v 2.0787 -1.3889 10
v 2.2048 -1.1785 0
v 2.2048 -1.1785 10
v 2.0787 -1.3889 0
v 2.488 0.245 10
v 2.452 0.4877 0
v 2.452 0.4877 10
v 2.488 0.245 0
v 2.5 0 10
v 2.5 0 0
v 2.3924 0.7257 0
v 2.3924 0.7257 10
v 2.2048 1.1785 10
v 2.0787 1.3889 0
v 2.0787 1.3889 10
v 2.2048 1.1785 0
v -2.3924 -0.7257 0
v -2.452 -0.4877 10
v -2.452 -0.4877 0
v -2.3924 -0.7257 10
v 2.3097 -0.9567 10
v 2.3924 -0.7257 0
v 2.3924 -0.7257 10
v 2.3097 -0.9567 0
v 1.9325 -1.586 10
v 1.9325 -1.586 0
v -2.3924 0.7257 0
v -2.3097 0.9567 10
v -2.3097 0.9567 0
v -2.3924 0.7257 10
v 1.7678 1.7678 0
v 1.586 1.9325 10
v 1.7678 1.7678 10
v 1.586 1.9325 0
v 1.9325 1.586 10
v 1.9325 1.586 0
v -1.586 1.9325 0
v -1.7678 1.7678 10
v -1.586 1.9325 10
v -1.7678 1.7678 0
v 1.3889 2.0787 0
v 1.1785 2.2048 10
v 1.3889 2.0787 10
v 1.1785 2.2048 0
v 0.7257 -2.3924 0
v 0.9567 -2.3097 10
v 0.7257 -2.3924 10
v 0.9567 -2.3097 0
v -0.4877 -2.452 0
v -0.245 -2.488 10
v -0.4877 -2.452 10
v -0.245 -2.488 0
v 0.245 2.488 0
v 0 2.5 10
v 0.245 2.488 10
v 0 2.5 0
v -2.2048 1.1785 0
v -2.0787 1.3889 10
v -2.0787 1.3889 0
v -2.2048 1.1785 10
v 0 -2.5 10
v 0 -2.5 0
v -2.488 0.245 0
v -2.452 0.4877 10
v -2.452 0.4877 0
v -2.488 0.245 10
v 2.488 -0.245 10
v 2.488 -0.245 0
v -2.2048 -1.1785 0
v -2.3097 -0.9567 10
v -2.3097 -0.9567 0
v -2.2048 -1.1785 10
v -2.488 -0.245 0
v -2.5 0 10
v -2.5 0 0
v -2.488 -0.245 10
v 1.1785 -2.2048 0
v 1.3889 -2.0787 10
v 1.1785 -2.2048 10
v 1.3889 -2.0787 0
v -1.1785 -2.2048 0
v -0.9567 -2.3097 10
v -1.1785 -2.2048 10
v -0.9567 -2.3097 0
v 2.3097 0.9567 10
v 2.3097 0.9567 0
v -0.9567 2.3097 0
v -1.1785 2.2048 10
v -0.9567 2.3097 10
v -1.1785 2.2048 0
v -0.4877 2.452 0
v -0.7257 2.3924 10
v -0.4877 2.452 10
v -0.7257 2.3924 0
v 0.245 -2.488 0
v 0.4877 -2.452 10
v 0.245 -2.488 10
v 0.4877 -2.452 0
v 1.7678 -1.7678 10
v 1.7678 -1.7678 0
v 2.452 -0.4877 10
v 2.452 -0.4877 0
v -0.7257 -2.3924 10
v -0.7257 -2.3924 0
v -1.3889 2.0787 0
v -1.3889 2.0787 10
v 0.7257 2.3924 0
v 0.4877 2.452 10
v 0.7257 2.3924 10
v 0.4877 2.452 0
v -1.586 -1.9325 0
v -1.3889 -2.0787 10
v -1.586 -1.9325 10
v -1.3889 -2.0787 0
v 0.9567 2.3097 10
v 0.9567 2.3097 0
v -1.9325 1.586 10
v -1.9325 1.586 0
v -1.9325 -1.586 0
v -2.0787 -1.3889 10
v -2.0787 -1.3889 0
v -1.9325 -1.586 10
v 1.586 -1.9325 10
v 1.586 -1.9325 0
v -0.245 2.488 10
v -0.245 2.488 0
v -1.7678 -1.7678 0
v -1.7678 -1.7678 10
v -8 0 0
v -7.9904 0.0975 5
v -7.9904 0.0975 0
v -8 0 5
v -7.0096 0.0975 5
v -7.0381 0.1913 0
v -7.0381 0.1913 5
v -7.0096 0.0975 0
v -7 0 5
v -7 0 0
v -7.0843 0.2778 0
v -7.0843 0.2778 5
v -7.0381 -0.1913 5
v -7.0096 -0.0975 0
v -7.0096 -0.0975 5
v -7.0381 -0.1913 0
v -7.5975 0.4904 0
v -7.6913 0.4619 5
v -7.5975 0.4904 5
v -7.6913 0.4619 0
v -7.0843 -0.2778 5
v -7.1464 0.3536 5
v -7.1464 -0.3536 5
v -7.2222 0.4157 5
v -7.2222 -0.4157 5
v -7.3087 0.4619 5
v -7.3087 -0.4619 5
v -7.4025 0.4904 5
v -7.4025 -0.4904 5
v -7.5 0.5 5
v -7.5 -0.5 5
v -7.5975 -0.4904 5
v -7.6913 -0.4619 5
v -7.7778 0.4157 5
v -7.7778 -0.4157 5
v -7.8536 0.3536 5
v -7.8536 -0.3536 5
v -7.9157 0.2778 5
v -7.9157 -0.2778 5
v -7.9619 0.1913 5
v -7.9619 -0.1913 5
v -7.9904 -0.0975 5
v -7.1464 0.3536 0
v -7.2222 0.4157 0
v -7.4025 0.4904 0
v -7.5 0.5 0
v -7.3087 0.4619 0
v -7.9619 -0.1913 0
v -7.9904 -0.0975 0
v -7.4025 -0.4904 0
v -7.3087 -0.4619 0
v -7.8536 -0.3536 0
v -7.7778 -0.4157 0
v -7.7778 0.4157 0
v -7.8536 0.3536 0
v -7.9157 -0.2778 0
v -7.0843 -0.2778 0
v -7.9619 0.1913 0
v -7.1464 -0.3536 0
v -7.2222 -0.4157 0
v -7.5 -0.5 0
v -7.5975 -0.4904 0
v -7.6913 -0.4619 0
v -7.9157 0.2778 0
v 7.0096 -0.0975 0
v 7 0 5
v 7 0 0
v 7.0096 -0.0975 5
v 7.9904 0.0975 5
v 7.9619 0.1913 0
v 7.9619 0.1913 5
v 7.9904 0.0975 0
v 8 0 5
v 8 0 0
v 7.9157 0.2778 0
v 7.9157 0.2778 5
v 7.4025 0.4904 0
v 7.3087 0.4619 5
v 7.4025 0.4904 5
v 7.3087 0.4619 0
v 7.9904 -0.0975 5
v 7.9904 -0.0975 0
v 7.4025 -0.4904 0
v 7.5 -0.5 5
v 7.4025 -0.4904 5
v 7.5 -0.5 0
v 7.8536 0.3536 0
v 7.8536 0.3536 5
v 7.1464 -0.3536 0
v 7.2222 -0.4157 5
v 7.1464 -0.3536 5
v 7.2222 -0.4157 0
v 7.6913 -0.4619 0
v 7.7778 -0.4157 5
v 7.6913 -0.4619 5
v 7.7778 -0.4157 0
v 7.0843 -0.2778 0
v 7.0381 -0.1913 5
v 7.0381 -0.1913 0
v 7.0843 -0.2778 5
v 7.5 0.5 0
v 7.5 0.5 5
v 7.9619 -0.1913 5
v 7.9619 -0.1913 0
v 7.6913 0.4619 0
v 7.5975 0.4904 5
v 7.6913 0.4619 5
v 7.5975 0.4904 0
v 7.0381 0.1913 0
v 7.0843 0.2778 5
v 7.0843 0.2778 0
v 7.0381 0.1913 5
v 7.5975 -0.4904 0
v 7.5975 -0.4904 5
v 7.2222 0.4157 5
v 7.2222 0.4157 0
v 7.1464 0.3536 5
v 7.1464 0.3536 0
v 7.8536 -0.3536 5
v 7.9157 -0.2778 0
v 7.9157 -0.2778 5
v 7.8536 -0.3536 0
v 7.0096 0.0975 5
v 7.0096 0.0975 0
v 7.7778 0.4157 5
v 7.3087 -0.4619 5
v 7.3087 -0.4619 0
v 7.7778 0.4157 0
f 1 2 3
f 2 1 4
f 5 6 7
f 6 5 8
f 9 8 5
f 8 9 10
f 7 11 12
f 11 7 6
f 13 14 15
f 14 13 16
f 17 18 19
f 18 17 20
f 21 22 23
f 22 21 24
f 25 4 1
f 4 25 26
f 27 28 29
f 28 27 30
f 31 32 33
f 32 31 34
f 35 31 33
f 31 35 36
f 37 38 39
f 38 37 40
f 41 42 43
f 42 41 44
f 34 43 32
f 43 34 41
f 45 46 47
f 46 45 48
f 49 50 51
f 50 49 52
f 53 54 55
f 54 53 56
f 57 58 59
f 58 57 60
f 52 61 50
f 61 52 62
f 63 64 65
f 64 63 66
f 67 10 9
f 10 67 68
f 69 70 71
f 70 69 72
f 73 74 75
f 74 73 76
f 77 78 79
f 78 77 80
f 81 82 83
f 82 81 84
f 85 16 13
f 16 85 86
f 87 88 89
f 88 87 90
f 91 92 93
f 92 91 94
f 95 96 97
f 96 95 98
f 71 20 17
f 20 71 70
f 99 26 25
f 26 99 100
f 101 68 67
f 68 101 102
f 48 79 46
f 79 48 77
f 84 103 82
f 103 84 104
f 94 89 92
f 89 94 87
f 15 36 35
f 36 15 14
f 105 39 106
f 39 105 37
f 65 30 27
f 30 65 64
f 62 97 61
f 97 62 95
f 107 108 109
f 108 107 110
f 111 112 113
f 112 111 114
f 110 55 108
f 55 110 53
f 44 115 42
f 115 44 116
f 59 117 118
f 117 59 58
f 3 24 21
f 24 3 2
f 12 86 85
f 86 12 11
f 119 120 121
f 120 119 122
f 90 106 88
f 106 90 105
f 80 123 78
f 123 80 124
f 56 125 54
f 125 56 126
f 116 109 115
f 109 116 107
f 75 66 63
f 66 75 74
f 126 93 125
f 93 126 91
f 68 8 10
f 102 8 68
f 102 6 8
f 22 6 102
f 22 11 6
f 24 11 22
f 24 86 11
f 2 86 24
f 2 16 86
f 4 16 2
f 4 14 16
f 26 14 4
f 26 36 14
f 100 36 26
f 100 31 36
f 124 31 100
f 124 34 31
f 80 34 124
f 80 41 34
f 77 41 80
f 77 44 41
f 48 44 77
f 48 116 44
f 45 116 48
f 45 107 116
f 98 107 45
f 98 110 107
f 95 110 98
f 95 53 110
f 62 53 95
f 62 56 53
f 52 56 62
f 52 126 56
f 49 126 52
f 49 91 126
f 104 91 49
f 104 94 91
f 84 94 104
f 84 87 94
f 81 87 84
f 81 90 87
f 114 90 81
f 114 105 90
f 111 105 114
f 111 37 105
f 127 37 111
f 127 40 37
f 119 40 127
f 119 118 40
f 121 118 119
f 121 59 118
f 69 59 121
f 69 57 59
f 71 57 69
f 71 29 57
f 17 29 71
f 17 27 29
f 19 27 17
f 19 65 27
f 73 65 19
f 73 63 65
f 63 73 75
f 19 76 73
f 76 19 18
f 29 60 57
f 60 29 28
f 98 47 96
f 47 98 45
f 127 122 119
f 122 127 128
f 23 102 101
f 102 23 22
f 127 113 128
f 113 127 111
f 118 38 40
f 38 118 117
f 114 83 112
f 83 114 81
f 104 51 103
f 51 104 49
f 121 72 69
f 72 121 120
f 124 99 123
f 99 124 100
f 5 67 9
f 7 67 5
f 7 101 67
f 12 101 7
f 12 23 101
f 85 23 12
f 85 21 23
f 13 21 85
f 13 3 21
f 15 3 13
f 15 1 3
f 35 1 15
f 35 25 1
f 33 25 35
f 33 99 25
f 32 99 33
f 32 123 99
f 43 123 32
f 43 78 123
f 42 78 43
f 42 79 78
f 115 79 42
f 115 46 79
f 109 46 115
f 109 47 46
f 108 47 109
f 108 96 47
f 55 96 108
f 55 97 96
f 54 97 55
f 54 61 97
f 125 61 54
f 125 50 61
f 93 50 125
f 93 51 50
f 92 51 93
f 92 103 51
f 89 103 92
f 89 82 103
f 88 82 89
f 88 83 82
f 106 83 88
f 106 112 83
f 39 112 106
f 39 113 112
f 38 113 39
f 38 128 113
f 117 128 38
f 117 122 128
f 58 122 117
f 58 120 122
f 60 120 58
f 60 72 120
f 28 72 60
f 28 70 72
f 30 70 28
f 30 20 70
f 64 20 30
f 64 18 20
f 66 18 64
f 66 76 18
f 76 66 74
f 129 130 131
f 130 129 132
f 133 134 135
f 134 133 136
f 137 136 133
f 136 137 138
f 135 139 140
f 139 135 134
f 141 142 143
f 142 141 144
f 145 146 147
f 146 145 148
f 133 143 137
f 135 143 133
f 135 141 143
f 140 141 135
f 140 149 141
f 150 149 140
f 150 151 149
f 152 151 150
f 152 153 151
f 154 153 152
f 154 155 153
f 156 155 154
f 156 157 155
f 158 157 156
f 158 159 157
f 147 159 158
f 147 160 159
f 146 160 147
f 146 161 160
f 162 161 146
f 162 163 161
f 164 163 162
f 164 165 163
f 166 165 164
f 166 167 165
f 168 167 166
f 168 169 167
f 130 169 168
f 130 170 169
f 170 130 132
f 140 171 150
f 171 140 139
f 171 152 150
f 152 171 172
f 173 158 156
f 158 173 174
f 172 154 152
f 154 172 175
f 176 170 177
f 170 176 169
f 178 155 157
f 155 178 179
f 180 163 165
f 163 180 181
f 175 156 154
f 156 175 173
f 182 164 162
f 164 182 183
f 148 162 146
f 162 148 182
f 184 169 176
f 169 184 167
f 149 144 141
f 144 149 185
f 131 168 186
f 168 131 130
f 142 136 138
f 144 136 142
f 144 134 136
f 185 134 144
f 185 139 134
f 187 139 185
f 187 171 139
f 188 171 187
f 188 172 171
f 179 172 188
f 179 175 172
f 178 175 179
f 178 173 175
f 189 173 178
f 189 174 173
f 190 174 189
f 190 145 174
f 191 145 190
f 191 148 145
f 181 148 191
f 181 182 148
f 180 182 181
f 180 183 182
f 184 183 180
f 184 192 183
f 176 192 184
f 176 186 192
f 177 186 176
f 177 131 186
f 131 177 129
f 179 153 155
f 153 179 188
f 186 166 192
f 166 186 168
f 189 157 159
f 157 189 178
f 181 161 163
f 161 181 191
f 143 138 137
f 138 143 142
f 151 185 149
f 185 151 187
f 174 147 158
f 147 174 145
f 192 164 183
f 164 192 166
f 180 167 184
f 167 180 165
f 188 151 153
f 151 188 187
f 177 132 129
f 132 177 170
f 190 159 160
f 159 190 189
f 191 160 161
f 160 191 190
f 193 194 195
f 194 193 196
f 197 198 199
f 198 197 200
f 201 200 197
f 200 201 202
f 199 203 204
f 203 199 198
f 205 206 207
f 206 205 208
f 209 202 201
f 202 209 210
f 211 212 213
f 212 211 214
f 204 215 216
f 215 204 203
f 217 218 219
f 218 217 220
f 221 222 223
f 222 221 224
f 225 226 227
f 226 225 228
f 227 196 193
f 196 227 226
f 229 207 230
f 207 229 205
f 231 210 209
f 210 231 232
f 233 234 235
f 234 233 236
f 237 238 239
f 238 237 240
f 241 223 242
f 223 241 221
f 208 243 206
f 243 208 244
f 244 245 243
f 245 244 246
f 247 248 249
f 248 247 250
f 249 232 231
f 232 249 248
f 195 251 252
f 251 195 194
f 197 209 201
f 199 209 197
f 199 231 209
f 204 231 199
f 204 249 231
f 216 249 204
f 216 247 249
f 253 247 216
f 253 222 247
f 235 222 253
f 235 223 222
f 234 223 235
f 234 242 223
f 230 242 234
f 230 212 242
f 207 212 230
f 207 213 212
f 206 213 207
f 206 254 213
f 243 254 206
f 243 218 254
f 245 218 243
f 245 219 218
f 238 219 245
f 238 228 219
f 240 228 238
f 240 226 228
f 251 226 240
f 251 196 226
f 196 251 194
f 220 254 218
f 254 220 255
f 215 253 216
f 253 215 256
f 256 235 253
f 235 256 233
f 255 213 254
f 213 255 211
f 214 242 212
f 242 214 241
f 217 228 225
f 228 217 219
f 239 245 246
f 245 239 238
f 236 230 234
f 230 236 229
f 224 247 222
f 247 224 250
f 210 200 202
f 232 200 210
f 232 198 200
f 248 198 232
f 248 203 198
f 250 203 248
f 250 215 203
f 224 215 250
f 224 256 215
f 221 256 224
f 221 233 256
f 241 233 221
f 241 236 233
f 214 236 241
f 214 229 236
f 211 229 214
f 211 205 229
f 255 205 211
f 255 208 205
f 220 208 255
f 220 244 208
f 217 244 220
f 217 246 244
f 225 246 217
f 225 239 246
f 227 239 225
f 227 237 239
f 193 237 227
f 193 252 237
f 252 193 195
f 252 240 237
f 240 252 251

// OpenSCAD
module resistor() {
    // Main body of the resistor
    cylinder(h=10, d=5, $fn=64);
    
    // Left lead
    translate([-7.5, 0, 0])
        cylinder(h=5, d=1, $fn=32);
    
    // Right lead
    translate([7.5, 0, 0])
        cylinder(h=5, d=1, $fn=32);
}

resistor();
